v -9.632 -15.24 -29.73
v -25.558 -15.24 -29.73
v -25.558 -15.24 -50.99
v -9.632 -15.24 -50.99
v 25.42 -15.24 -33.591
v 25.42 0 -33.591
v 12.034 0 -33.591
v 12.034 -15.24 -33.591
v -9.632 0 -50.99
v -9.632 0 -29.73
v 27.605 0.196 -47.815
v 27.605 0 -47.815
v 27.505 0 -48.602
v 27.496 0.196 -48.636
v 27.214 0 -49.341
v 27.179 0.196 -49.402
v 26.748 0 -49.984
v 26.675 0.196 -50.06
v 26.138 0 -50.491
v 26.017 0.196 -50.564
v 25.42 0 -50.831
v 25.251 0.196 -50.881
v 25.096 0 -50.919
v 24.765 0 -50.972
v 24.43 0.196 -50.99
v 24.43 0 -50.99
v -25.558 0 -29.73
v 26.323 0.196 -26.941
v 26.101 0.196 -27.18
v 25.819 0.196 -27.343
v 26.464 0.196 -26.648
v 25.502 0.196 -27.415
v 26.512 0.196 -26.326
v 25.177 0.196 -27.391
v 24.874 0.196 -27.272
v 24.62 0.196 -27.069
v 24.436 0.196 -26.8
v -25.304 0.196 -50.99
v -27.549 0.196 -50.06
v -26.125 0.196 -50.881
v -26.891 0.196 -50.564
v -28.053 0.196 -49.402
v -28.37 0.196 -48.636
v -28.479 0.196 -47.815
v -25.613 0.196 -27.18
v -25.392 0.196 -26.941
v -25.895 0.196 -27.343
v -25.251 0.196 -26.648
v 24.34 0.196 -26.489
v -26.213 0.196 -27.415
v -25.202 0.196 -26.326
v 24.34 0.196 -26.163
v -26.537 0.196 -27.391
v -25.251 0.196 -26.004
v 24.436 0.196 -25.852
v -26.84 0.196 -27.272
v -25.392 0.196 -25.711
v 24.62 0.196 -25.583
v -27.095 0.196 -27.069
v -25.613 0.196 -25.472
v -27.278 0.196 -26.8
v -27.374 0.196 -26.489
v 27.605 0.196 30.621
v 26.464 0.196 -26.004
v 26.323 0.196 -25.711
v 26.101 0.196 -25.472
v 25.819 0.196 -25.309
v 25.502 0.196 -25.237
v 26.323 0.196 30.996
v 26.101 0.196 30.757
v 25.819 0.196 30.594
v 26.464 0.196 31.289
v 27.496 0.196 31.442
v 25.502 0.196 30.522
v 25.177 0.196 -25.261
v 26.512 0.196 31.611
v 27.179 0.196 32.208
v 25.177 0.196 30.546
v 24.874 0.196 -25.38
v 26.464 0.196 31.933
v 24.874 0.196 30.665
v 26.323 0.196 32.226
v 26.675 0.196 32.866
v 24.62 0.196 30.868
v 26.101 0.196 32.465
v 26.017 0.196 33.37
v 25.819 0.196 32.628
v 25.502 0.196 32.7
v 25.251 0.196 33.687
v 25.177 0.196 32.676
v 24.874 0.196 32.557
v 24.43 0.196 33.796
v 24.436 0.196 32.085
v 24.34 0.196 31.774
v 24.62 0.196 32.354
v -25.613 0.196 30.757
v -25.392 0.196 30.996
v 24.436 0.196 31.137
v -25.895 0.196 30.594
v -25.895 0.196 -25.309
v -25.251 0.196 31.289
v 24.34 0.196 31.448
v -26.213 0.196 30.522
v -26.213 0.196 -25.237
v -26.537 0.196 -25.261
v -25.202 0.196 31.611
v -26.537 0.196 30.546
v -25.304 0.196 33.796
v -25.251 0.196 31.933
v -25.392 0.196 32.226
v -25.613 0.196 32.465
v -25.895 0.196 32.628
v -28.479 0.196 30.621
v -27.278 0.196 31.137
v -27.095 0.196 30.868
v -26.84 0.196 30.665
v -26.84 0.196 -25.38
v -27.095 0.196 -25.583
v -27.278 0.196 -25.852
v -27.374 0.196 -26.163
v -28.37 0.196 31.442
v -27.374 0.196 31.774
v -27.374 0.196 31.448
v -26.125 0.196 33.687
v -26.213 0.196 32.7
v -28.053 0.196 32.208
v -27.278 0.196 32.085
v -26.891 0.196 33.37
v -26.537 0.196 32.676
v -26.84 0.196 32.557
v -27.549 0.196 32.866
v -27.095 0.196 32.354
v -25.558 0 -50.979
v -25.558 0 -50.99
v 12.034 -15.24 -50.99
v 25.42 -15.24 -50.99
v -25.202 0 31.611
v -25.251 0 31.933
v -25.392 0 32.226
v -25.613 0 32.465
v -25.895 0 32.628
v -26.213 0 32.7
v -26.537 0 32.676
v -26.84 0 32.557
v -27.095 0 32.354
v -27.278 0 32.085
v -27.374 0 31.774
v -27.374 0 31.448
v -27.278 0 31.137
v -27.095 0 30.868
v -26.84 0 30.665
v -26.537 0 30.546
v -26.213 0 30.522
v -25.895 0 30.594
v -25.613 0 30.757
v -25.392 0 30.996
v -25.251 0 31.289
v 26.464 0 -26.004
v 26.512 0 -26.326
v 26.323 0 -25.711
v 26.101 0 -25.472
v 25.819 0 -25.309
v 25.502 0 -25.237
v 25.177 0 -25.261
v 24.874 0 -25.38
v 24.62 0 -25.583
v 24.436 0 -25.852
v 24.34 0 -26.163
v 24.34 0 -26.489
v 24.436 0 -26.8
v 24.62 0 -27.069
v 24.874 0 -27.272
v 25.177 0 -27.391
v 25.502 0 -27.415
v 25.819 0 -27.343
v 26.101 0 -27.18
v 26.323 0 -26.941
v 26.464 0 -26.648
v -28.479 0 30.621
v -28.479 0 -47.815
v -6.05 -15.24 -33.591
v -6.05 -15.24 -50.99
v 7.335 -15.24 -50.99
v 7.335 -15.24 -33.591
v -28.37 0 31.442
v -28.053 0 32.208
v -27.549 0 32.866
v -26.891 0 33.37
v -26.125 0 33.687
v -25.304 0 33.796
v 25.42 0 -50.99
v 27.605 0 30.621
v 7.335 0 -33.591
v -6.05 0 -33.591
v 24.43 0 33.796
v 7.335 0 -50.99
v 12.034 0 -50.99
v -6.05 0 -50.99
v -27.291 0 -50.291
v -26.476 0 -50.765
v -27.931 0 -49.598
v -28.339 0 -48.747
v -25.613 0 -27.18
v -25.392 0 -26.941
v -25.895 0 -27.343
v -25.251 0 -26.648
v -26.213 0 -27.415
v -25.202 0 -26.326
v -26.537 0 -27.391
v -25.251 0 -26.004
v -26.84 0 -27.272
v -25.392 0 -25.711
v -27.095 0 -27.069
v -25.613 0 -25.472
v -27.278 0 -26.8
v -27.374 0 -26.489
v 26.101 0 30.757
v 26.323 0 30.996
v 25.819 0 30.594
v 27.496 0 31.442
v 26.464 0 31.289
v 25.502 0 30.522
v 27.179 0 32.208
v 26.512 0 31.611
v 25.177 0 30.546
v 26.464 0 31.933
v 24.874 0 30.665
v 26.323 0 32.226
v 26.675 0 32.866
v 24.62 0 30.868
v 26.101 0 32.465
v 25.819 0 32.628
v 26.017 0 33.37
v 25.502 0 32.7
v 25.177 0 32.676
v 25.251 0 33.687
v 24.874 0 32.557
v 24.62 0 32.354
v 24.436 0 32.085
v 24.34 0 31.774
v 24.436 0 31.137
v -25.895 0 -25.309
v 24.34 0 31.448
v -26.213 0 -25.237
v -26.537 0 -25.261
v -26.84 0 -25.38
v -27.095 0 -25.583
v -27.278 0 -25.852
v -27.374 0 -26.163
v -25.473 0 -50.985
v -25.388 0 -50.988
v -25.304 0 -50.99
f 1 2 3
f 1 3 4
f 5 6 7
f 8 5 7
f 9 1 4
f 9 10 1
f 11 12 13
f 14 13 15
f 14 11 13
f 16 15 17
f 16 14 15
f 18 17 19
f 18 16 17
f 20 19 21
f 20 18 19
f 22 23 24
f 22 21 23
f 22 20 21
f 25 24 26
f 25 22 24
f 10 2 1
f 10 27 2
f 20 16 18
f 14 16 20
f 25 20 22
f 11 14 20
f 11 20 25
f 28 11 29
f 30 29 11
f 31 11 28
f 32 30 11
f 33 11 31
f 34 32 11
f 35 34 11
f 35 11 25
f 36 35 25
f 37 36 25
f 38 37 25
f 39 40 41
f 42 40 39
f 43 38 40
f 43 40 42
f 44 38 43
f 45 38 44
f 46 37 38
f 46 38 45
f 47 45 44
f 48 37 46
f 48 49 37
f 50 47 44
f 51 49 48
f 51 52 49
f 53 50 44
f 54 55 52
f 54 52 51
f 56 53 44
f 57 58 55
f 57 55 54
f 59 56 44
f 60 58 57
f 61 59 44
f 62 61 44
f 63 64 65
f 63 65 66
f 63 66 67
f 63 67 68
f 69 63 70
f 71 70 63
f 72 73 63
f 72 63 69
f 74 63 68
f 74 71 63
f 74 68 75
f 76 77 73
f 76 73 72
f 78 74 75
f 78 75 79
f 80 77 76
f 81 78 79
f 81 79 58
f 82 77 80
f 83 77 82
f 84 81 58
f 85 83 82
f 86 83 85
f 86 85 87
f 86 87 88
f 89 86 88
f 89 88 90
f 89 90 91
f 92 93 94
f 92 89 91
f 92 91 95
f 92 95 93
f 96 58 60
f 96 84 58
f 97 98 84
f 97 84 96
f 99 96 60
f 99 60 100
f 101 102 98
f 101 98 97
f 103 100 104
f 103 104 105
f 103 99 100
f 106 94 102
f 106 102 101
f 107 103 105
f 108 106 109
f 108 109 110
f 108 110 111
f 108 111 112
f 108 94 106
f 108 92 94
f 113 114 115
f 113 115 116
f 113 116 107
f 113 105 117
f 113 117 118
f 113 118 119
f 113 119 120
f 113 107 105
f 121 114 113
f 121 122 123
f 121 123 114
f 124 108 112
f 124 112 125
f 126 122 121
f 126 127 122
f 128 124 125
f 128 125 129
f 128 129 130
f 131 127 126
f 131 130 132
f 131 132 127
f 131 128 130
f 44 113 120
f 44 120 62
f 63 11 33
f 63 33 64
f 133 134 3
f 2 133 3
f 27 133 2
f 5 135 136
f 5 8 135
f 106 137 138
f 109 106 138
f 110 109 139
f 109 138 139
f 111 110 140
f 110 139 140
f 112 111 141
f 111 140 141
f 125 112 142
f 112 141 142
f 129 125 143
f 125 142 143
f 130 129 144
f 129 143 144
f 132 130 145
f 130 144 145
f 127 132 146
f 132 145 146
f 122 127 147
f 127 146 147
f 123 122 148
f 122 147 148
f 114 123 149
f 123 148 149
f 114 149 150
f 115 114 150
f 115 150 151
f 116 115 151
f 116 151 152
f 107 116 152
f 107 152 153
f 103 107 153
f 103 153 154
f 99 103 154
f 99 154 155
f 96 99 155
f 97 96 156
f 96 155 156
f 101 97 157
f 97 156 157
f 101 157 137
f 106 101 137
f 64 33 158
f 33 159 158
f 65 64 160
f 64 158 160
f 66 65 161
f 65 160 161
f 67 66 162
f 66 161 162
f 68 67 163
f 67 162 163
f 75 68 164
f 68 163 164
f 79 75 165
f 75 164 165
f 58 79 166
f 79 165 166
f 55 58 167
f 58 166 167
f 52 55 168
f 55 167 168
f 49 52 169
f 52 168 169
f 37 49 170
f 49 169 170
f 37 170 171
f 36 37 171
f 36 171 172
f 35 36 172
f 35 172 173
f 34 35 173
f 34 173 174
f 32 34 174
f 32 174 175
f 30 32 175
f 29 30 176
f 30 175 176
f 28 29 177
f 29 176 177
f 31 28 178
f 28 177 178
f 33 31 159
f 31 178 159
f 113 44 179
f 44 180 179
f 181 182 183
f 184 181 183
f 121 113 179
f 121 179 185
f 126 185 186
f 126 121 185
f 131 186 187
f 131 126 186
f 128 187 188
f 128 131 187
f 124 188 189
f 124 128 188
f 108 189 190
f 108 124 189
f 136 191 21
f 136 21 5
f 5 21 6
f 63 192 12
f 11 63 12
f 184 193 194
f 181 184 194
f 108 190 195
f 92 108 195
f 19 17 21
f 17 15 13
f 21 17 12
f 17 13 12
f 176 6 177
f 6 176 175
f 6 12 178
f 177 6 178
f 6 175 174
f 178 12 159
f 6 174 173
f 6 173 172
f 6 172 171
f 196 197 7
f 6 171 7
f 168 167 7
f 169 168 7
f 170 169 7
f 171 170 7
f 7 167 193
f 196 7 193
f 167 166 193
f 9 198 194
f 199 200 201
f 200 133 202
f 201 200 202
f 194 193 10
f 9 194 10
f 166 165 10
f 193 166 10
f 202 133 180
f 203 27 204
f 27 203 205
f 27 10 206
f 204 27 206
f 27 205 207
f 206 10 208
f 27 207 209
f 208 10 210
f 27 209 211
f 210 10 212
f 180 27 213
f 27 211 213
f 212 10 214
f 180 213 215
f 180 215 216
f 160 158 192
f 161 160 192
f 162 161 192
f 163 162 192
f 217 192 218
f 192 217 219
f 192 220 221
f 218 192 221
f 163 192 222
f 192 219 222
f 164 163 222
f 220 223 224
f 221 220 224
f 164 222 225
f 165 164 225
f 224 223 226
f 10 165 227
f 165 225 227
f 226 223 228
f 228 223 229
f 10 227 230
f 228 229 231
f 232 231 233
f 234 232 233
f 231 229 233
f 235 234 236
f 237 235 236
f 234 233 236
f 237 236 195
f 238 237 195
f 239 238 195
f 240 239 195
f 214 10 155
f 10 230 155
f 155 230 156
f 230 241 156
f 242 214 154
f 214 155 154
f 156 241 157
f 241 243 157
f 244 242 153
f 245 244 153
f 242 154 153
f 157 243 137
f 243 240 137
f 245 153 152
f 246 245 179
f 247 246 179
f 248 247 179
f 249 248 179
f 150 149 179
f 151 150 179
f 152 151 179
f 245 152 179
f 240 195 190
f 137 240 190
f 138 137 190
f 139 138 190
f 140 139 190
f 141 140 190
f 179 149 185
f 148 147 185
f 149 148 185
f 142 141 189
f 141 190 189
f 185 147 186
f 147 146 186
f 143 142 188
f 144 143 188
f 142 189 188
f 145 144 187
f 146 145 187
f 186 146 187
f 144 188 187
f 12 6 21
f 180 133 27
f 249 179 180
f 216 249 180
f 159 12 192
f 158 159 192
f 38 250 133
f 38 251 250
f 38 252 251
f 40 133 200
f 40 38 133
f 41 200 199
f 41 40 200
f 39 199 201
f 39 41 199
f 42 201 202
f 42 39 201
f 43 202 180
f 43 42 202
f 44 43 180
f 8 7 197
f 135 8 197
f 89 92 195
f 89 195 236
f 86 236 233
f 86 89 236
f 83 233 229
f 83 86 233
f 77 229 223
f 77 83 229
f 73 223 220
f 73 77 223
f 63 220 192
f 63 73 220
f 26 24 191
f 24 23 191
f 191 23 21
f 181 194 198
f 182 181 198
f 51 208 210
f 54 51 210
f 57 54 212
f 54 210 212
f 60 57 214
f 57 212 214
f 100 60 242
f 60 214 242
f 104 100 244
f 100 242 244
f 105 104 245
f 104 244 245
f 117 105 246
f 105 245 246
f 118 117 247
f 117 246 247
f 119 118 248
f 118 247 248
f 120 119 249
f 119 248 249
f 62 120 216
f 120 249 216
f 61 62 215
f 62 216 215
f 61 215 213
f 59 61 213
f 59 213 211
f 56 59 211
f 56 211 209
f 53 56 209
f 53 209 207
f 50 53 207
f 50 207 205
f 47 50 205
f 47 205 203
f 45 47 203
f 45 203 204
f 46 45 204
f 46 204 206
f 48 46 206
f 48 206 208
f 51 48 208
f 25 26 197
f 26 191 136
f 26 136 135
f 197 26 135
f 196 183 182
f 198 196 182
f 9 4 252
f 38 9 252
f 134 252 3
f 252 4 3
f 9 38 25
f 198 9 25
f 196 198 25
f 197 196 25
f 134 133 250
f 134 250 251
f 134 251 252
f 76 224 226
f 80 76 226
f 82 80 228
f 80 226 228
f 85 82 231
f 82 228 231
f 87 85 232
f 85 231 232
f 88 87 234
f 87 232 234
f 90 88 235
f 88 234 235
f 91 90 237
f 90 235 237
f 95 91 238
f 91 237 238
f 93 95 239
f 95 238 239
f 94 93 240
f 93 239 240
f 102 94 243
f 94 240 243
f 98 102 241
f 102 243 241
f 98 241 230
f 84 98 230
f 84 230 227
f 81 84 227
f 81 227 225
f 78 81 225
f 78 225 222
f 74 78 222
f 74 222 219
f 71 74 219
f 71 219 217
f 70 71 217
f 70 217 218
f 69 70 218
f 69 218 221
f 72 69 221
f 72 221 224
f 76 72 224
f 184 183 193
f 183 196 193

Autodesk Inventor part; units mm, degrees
ref_plane "YZ Plane" through (0, 0, 0) normal (1, 0, 0) x (0, 1, 0)
ref_plane "XZ Plane" through (0, 0, 0) normal (0, 1, 0) x (-1, 0, 0)
ref_plane "XY Plane" through (0, 0, 0) normal (0, 0, 1) x (1, 0, 0)
sketch "Sketch1" plane through (0, 0, 0) normal (0, 1, 0) x (-1, 0, 0)
  line L0 (28.4786, 33.7956) -> (-27.6046, 33.7956)
  line L1 (-27.6046, 33.7956) -> (-27.6046, -50.9896)
  line L2 (-27.6046, -50.9896) -> (28.4786, -50.9896)
  line L3 (28.4786, -50.9896) -> (28.4786, 33.7956)
  point P0 (0, 0)
  dimension "d0" = 56.0832
  dimension "d1" = 84.7852
extrude "Extrusion1" add sketch "Sketch1" along normal blind 0.1956
fillet "Fillet1" radius 3.175 4 edges at (27.6046, 0.0978, -50.9896) (-28.4786, 0.0978, -50.9896) (-28.4786, 0.0978, 33.7956) (27.6046, 0.0978, 33.7956)
sketch "Sketch2" plane through (0, 0, 0) normal (0, -1, 0) x (1, 0, 0)
  line L0 (-28.4786, -47.8146) -> (-28.4786, 30.6206) construction
  line L1 (-28.4786, 31.6112) -> (-26.2942, 31.6112) construction
  line L2 (-26.2942, 31.6112) -> (-26.2942, 33.7956) construction
  line L3 (-25.3036, 33.7956) -> (24.4296, 33.7956) construction
  circle A0 centre (-26.2942, 31.6112) radius 1.0922
  line L4 (27.6046, 30.6206) -> (27.6046, -47.8146) construction
  line L5 (27.6046, 31.6112) -> (25.4202, 31.6112) construction
  line L6 (25.4202, 31.6112) -> (25.4202, 33.7956) construction
  circle A1 centre (25.4202, 31.6112) radius 1.0922
  circle A2 centre (-26.2942, -26.3261) radius 1.0921
  circle A3 centre (25.4202, -26.3261) radius 1.0921
  point P0 (0, 0)
  dimension "d5" = 2.1844
  dimension "d6" = 2.1844
  dimension "d7" = 2.1844
  dimension "d8" = 2.1844
  dimension "d9" = 55.753
  dimension "d10" = 55.753
extrude "Extrusion2" cut sketch "Sketch2" against normal blind 0.1956
sketch "Sketch3" plane through (0, 0, 0) normal (0, -1, 0) x (1, 0, 0)
  line L0 (25.4202, -33.5906) -> (12.0344, -33.5906)
  line L1 (12.0344, -33.5906) -> (12.0344, -50.9896)
  line L2 (12.0344, -50.9896) -> (25.4202, -50.9896)
  line L3 (25.4202, -50.9896) -> (25.4202, -33.5906)
  line L4 (7.3354, -33.5906) -> (-6.0504, -33.5906)
  line L5 (-6.0504, -33.5906) -> (-6.0504, -50.9896)
  line L6 (-6.0504, -50.9896) -> (7.3354, -50.9896)
  line L7 (7.3354, -50.9896) -> (7.3354, -33.5906)
  line L8 (-25.5576, -29.7298) -> (-9.6318, -29.7298)
  line L9 (-9.6318, -29.7298) -> (-9.6318, -50.9896)
  line L10 (-9.6318, -50.9896) -> (-25.5576, -50.9896)
  line L11 (-25.5576, -50.9896) -> (-25.5576, -29.7298)
  line L12 (24.4296, -50.9896) -> (-25.3036, -50.9896) projected
  line L13 (27.6046, 30.6206) -> (27.6046, -47.8146) projected
  point P0 (0, 0)
  dimension "d13" = 13.3858
  dimension "d14" = 13.3858
  dimension "d16" = 17.399
  dimension "d18" = 21.2598
  dimension "d19" = 15.9258
  dimension "d20" = 0
  dimension "d21" = 0
  dimension "d22" = 4.699
  dimension "d23" = 3.5814
  dimension "d24" = 2.1844
extrude "Extrusion3" add sketch "Sketch3" along normal blind 15.24
equation "\"d6\" = d5"
equation "\"d7\" = d6"
equation "\"d8\" = d5"
equation "\"d10\" = d9"
equation "\"d14\" = d13"
properties part number "RPI"
